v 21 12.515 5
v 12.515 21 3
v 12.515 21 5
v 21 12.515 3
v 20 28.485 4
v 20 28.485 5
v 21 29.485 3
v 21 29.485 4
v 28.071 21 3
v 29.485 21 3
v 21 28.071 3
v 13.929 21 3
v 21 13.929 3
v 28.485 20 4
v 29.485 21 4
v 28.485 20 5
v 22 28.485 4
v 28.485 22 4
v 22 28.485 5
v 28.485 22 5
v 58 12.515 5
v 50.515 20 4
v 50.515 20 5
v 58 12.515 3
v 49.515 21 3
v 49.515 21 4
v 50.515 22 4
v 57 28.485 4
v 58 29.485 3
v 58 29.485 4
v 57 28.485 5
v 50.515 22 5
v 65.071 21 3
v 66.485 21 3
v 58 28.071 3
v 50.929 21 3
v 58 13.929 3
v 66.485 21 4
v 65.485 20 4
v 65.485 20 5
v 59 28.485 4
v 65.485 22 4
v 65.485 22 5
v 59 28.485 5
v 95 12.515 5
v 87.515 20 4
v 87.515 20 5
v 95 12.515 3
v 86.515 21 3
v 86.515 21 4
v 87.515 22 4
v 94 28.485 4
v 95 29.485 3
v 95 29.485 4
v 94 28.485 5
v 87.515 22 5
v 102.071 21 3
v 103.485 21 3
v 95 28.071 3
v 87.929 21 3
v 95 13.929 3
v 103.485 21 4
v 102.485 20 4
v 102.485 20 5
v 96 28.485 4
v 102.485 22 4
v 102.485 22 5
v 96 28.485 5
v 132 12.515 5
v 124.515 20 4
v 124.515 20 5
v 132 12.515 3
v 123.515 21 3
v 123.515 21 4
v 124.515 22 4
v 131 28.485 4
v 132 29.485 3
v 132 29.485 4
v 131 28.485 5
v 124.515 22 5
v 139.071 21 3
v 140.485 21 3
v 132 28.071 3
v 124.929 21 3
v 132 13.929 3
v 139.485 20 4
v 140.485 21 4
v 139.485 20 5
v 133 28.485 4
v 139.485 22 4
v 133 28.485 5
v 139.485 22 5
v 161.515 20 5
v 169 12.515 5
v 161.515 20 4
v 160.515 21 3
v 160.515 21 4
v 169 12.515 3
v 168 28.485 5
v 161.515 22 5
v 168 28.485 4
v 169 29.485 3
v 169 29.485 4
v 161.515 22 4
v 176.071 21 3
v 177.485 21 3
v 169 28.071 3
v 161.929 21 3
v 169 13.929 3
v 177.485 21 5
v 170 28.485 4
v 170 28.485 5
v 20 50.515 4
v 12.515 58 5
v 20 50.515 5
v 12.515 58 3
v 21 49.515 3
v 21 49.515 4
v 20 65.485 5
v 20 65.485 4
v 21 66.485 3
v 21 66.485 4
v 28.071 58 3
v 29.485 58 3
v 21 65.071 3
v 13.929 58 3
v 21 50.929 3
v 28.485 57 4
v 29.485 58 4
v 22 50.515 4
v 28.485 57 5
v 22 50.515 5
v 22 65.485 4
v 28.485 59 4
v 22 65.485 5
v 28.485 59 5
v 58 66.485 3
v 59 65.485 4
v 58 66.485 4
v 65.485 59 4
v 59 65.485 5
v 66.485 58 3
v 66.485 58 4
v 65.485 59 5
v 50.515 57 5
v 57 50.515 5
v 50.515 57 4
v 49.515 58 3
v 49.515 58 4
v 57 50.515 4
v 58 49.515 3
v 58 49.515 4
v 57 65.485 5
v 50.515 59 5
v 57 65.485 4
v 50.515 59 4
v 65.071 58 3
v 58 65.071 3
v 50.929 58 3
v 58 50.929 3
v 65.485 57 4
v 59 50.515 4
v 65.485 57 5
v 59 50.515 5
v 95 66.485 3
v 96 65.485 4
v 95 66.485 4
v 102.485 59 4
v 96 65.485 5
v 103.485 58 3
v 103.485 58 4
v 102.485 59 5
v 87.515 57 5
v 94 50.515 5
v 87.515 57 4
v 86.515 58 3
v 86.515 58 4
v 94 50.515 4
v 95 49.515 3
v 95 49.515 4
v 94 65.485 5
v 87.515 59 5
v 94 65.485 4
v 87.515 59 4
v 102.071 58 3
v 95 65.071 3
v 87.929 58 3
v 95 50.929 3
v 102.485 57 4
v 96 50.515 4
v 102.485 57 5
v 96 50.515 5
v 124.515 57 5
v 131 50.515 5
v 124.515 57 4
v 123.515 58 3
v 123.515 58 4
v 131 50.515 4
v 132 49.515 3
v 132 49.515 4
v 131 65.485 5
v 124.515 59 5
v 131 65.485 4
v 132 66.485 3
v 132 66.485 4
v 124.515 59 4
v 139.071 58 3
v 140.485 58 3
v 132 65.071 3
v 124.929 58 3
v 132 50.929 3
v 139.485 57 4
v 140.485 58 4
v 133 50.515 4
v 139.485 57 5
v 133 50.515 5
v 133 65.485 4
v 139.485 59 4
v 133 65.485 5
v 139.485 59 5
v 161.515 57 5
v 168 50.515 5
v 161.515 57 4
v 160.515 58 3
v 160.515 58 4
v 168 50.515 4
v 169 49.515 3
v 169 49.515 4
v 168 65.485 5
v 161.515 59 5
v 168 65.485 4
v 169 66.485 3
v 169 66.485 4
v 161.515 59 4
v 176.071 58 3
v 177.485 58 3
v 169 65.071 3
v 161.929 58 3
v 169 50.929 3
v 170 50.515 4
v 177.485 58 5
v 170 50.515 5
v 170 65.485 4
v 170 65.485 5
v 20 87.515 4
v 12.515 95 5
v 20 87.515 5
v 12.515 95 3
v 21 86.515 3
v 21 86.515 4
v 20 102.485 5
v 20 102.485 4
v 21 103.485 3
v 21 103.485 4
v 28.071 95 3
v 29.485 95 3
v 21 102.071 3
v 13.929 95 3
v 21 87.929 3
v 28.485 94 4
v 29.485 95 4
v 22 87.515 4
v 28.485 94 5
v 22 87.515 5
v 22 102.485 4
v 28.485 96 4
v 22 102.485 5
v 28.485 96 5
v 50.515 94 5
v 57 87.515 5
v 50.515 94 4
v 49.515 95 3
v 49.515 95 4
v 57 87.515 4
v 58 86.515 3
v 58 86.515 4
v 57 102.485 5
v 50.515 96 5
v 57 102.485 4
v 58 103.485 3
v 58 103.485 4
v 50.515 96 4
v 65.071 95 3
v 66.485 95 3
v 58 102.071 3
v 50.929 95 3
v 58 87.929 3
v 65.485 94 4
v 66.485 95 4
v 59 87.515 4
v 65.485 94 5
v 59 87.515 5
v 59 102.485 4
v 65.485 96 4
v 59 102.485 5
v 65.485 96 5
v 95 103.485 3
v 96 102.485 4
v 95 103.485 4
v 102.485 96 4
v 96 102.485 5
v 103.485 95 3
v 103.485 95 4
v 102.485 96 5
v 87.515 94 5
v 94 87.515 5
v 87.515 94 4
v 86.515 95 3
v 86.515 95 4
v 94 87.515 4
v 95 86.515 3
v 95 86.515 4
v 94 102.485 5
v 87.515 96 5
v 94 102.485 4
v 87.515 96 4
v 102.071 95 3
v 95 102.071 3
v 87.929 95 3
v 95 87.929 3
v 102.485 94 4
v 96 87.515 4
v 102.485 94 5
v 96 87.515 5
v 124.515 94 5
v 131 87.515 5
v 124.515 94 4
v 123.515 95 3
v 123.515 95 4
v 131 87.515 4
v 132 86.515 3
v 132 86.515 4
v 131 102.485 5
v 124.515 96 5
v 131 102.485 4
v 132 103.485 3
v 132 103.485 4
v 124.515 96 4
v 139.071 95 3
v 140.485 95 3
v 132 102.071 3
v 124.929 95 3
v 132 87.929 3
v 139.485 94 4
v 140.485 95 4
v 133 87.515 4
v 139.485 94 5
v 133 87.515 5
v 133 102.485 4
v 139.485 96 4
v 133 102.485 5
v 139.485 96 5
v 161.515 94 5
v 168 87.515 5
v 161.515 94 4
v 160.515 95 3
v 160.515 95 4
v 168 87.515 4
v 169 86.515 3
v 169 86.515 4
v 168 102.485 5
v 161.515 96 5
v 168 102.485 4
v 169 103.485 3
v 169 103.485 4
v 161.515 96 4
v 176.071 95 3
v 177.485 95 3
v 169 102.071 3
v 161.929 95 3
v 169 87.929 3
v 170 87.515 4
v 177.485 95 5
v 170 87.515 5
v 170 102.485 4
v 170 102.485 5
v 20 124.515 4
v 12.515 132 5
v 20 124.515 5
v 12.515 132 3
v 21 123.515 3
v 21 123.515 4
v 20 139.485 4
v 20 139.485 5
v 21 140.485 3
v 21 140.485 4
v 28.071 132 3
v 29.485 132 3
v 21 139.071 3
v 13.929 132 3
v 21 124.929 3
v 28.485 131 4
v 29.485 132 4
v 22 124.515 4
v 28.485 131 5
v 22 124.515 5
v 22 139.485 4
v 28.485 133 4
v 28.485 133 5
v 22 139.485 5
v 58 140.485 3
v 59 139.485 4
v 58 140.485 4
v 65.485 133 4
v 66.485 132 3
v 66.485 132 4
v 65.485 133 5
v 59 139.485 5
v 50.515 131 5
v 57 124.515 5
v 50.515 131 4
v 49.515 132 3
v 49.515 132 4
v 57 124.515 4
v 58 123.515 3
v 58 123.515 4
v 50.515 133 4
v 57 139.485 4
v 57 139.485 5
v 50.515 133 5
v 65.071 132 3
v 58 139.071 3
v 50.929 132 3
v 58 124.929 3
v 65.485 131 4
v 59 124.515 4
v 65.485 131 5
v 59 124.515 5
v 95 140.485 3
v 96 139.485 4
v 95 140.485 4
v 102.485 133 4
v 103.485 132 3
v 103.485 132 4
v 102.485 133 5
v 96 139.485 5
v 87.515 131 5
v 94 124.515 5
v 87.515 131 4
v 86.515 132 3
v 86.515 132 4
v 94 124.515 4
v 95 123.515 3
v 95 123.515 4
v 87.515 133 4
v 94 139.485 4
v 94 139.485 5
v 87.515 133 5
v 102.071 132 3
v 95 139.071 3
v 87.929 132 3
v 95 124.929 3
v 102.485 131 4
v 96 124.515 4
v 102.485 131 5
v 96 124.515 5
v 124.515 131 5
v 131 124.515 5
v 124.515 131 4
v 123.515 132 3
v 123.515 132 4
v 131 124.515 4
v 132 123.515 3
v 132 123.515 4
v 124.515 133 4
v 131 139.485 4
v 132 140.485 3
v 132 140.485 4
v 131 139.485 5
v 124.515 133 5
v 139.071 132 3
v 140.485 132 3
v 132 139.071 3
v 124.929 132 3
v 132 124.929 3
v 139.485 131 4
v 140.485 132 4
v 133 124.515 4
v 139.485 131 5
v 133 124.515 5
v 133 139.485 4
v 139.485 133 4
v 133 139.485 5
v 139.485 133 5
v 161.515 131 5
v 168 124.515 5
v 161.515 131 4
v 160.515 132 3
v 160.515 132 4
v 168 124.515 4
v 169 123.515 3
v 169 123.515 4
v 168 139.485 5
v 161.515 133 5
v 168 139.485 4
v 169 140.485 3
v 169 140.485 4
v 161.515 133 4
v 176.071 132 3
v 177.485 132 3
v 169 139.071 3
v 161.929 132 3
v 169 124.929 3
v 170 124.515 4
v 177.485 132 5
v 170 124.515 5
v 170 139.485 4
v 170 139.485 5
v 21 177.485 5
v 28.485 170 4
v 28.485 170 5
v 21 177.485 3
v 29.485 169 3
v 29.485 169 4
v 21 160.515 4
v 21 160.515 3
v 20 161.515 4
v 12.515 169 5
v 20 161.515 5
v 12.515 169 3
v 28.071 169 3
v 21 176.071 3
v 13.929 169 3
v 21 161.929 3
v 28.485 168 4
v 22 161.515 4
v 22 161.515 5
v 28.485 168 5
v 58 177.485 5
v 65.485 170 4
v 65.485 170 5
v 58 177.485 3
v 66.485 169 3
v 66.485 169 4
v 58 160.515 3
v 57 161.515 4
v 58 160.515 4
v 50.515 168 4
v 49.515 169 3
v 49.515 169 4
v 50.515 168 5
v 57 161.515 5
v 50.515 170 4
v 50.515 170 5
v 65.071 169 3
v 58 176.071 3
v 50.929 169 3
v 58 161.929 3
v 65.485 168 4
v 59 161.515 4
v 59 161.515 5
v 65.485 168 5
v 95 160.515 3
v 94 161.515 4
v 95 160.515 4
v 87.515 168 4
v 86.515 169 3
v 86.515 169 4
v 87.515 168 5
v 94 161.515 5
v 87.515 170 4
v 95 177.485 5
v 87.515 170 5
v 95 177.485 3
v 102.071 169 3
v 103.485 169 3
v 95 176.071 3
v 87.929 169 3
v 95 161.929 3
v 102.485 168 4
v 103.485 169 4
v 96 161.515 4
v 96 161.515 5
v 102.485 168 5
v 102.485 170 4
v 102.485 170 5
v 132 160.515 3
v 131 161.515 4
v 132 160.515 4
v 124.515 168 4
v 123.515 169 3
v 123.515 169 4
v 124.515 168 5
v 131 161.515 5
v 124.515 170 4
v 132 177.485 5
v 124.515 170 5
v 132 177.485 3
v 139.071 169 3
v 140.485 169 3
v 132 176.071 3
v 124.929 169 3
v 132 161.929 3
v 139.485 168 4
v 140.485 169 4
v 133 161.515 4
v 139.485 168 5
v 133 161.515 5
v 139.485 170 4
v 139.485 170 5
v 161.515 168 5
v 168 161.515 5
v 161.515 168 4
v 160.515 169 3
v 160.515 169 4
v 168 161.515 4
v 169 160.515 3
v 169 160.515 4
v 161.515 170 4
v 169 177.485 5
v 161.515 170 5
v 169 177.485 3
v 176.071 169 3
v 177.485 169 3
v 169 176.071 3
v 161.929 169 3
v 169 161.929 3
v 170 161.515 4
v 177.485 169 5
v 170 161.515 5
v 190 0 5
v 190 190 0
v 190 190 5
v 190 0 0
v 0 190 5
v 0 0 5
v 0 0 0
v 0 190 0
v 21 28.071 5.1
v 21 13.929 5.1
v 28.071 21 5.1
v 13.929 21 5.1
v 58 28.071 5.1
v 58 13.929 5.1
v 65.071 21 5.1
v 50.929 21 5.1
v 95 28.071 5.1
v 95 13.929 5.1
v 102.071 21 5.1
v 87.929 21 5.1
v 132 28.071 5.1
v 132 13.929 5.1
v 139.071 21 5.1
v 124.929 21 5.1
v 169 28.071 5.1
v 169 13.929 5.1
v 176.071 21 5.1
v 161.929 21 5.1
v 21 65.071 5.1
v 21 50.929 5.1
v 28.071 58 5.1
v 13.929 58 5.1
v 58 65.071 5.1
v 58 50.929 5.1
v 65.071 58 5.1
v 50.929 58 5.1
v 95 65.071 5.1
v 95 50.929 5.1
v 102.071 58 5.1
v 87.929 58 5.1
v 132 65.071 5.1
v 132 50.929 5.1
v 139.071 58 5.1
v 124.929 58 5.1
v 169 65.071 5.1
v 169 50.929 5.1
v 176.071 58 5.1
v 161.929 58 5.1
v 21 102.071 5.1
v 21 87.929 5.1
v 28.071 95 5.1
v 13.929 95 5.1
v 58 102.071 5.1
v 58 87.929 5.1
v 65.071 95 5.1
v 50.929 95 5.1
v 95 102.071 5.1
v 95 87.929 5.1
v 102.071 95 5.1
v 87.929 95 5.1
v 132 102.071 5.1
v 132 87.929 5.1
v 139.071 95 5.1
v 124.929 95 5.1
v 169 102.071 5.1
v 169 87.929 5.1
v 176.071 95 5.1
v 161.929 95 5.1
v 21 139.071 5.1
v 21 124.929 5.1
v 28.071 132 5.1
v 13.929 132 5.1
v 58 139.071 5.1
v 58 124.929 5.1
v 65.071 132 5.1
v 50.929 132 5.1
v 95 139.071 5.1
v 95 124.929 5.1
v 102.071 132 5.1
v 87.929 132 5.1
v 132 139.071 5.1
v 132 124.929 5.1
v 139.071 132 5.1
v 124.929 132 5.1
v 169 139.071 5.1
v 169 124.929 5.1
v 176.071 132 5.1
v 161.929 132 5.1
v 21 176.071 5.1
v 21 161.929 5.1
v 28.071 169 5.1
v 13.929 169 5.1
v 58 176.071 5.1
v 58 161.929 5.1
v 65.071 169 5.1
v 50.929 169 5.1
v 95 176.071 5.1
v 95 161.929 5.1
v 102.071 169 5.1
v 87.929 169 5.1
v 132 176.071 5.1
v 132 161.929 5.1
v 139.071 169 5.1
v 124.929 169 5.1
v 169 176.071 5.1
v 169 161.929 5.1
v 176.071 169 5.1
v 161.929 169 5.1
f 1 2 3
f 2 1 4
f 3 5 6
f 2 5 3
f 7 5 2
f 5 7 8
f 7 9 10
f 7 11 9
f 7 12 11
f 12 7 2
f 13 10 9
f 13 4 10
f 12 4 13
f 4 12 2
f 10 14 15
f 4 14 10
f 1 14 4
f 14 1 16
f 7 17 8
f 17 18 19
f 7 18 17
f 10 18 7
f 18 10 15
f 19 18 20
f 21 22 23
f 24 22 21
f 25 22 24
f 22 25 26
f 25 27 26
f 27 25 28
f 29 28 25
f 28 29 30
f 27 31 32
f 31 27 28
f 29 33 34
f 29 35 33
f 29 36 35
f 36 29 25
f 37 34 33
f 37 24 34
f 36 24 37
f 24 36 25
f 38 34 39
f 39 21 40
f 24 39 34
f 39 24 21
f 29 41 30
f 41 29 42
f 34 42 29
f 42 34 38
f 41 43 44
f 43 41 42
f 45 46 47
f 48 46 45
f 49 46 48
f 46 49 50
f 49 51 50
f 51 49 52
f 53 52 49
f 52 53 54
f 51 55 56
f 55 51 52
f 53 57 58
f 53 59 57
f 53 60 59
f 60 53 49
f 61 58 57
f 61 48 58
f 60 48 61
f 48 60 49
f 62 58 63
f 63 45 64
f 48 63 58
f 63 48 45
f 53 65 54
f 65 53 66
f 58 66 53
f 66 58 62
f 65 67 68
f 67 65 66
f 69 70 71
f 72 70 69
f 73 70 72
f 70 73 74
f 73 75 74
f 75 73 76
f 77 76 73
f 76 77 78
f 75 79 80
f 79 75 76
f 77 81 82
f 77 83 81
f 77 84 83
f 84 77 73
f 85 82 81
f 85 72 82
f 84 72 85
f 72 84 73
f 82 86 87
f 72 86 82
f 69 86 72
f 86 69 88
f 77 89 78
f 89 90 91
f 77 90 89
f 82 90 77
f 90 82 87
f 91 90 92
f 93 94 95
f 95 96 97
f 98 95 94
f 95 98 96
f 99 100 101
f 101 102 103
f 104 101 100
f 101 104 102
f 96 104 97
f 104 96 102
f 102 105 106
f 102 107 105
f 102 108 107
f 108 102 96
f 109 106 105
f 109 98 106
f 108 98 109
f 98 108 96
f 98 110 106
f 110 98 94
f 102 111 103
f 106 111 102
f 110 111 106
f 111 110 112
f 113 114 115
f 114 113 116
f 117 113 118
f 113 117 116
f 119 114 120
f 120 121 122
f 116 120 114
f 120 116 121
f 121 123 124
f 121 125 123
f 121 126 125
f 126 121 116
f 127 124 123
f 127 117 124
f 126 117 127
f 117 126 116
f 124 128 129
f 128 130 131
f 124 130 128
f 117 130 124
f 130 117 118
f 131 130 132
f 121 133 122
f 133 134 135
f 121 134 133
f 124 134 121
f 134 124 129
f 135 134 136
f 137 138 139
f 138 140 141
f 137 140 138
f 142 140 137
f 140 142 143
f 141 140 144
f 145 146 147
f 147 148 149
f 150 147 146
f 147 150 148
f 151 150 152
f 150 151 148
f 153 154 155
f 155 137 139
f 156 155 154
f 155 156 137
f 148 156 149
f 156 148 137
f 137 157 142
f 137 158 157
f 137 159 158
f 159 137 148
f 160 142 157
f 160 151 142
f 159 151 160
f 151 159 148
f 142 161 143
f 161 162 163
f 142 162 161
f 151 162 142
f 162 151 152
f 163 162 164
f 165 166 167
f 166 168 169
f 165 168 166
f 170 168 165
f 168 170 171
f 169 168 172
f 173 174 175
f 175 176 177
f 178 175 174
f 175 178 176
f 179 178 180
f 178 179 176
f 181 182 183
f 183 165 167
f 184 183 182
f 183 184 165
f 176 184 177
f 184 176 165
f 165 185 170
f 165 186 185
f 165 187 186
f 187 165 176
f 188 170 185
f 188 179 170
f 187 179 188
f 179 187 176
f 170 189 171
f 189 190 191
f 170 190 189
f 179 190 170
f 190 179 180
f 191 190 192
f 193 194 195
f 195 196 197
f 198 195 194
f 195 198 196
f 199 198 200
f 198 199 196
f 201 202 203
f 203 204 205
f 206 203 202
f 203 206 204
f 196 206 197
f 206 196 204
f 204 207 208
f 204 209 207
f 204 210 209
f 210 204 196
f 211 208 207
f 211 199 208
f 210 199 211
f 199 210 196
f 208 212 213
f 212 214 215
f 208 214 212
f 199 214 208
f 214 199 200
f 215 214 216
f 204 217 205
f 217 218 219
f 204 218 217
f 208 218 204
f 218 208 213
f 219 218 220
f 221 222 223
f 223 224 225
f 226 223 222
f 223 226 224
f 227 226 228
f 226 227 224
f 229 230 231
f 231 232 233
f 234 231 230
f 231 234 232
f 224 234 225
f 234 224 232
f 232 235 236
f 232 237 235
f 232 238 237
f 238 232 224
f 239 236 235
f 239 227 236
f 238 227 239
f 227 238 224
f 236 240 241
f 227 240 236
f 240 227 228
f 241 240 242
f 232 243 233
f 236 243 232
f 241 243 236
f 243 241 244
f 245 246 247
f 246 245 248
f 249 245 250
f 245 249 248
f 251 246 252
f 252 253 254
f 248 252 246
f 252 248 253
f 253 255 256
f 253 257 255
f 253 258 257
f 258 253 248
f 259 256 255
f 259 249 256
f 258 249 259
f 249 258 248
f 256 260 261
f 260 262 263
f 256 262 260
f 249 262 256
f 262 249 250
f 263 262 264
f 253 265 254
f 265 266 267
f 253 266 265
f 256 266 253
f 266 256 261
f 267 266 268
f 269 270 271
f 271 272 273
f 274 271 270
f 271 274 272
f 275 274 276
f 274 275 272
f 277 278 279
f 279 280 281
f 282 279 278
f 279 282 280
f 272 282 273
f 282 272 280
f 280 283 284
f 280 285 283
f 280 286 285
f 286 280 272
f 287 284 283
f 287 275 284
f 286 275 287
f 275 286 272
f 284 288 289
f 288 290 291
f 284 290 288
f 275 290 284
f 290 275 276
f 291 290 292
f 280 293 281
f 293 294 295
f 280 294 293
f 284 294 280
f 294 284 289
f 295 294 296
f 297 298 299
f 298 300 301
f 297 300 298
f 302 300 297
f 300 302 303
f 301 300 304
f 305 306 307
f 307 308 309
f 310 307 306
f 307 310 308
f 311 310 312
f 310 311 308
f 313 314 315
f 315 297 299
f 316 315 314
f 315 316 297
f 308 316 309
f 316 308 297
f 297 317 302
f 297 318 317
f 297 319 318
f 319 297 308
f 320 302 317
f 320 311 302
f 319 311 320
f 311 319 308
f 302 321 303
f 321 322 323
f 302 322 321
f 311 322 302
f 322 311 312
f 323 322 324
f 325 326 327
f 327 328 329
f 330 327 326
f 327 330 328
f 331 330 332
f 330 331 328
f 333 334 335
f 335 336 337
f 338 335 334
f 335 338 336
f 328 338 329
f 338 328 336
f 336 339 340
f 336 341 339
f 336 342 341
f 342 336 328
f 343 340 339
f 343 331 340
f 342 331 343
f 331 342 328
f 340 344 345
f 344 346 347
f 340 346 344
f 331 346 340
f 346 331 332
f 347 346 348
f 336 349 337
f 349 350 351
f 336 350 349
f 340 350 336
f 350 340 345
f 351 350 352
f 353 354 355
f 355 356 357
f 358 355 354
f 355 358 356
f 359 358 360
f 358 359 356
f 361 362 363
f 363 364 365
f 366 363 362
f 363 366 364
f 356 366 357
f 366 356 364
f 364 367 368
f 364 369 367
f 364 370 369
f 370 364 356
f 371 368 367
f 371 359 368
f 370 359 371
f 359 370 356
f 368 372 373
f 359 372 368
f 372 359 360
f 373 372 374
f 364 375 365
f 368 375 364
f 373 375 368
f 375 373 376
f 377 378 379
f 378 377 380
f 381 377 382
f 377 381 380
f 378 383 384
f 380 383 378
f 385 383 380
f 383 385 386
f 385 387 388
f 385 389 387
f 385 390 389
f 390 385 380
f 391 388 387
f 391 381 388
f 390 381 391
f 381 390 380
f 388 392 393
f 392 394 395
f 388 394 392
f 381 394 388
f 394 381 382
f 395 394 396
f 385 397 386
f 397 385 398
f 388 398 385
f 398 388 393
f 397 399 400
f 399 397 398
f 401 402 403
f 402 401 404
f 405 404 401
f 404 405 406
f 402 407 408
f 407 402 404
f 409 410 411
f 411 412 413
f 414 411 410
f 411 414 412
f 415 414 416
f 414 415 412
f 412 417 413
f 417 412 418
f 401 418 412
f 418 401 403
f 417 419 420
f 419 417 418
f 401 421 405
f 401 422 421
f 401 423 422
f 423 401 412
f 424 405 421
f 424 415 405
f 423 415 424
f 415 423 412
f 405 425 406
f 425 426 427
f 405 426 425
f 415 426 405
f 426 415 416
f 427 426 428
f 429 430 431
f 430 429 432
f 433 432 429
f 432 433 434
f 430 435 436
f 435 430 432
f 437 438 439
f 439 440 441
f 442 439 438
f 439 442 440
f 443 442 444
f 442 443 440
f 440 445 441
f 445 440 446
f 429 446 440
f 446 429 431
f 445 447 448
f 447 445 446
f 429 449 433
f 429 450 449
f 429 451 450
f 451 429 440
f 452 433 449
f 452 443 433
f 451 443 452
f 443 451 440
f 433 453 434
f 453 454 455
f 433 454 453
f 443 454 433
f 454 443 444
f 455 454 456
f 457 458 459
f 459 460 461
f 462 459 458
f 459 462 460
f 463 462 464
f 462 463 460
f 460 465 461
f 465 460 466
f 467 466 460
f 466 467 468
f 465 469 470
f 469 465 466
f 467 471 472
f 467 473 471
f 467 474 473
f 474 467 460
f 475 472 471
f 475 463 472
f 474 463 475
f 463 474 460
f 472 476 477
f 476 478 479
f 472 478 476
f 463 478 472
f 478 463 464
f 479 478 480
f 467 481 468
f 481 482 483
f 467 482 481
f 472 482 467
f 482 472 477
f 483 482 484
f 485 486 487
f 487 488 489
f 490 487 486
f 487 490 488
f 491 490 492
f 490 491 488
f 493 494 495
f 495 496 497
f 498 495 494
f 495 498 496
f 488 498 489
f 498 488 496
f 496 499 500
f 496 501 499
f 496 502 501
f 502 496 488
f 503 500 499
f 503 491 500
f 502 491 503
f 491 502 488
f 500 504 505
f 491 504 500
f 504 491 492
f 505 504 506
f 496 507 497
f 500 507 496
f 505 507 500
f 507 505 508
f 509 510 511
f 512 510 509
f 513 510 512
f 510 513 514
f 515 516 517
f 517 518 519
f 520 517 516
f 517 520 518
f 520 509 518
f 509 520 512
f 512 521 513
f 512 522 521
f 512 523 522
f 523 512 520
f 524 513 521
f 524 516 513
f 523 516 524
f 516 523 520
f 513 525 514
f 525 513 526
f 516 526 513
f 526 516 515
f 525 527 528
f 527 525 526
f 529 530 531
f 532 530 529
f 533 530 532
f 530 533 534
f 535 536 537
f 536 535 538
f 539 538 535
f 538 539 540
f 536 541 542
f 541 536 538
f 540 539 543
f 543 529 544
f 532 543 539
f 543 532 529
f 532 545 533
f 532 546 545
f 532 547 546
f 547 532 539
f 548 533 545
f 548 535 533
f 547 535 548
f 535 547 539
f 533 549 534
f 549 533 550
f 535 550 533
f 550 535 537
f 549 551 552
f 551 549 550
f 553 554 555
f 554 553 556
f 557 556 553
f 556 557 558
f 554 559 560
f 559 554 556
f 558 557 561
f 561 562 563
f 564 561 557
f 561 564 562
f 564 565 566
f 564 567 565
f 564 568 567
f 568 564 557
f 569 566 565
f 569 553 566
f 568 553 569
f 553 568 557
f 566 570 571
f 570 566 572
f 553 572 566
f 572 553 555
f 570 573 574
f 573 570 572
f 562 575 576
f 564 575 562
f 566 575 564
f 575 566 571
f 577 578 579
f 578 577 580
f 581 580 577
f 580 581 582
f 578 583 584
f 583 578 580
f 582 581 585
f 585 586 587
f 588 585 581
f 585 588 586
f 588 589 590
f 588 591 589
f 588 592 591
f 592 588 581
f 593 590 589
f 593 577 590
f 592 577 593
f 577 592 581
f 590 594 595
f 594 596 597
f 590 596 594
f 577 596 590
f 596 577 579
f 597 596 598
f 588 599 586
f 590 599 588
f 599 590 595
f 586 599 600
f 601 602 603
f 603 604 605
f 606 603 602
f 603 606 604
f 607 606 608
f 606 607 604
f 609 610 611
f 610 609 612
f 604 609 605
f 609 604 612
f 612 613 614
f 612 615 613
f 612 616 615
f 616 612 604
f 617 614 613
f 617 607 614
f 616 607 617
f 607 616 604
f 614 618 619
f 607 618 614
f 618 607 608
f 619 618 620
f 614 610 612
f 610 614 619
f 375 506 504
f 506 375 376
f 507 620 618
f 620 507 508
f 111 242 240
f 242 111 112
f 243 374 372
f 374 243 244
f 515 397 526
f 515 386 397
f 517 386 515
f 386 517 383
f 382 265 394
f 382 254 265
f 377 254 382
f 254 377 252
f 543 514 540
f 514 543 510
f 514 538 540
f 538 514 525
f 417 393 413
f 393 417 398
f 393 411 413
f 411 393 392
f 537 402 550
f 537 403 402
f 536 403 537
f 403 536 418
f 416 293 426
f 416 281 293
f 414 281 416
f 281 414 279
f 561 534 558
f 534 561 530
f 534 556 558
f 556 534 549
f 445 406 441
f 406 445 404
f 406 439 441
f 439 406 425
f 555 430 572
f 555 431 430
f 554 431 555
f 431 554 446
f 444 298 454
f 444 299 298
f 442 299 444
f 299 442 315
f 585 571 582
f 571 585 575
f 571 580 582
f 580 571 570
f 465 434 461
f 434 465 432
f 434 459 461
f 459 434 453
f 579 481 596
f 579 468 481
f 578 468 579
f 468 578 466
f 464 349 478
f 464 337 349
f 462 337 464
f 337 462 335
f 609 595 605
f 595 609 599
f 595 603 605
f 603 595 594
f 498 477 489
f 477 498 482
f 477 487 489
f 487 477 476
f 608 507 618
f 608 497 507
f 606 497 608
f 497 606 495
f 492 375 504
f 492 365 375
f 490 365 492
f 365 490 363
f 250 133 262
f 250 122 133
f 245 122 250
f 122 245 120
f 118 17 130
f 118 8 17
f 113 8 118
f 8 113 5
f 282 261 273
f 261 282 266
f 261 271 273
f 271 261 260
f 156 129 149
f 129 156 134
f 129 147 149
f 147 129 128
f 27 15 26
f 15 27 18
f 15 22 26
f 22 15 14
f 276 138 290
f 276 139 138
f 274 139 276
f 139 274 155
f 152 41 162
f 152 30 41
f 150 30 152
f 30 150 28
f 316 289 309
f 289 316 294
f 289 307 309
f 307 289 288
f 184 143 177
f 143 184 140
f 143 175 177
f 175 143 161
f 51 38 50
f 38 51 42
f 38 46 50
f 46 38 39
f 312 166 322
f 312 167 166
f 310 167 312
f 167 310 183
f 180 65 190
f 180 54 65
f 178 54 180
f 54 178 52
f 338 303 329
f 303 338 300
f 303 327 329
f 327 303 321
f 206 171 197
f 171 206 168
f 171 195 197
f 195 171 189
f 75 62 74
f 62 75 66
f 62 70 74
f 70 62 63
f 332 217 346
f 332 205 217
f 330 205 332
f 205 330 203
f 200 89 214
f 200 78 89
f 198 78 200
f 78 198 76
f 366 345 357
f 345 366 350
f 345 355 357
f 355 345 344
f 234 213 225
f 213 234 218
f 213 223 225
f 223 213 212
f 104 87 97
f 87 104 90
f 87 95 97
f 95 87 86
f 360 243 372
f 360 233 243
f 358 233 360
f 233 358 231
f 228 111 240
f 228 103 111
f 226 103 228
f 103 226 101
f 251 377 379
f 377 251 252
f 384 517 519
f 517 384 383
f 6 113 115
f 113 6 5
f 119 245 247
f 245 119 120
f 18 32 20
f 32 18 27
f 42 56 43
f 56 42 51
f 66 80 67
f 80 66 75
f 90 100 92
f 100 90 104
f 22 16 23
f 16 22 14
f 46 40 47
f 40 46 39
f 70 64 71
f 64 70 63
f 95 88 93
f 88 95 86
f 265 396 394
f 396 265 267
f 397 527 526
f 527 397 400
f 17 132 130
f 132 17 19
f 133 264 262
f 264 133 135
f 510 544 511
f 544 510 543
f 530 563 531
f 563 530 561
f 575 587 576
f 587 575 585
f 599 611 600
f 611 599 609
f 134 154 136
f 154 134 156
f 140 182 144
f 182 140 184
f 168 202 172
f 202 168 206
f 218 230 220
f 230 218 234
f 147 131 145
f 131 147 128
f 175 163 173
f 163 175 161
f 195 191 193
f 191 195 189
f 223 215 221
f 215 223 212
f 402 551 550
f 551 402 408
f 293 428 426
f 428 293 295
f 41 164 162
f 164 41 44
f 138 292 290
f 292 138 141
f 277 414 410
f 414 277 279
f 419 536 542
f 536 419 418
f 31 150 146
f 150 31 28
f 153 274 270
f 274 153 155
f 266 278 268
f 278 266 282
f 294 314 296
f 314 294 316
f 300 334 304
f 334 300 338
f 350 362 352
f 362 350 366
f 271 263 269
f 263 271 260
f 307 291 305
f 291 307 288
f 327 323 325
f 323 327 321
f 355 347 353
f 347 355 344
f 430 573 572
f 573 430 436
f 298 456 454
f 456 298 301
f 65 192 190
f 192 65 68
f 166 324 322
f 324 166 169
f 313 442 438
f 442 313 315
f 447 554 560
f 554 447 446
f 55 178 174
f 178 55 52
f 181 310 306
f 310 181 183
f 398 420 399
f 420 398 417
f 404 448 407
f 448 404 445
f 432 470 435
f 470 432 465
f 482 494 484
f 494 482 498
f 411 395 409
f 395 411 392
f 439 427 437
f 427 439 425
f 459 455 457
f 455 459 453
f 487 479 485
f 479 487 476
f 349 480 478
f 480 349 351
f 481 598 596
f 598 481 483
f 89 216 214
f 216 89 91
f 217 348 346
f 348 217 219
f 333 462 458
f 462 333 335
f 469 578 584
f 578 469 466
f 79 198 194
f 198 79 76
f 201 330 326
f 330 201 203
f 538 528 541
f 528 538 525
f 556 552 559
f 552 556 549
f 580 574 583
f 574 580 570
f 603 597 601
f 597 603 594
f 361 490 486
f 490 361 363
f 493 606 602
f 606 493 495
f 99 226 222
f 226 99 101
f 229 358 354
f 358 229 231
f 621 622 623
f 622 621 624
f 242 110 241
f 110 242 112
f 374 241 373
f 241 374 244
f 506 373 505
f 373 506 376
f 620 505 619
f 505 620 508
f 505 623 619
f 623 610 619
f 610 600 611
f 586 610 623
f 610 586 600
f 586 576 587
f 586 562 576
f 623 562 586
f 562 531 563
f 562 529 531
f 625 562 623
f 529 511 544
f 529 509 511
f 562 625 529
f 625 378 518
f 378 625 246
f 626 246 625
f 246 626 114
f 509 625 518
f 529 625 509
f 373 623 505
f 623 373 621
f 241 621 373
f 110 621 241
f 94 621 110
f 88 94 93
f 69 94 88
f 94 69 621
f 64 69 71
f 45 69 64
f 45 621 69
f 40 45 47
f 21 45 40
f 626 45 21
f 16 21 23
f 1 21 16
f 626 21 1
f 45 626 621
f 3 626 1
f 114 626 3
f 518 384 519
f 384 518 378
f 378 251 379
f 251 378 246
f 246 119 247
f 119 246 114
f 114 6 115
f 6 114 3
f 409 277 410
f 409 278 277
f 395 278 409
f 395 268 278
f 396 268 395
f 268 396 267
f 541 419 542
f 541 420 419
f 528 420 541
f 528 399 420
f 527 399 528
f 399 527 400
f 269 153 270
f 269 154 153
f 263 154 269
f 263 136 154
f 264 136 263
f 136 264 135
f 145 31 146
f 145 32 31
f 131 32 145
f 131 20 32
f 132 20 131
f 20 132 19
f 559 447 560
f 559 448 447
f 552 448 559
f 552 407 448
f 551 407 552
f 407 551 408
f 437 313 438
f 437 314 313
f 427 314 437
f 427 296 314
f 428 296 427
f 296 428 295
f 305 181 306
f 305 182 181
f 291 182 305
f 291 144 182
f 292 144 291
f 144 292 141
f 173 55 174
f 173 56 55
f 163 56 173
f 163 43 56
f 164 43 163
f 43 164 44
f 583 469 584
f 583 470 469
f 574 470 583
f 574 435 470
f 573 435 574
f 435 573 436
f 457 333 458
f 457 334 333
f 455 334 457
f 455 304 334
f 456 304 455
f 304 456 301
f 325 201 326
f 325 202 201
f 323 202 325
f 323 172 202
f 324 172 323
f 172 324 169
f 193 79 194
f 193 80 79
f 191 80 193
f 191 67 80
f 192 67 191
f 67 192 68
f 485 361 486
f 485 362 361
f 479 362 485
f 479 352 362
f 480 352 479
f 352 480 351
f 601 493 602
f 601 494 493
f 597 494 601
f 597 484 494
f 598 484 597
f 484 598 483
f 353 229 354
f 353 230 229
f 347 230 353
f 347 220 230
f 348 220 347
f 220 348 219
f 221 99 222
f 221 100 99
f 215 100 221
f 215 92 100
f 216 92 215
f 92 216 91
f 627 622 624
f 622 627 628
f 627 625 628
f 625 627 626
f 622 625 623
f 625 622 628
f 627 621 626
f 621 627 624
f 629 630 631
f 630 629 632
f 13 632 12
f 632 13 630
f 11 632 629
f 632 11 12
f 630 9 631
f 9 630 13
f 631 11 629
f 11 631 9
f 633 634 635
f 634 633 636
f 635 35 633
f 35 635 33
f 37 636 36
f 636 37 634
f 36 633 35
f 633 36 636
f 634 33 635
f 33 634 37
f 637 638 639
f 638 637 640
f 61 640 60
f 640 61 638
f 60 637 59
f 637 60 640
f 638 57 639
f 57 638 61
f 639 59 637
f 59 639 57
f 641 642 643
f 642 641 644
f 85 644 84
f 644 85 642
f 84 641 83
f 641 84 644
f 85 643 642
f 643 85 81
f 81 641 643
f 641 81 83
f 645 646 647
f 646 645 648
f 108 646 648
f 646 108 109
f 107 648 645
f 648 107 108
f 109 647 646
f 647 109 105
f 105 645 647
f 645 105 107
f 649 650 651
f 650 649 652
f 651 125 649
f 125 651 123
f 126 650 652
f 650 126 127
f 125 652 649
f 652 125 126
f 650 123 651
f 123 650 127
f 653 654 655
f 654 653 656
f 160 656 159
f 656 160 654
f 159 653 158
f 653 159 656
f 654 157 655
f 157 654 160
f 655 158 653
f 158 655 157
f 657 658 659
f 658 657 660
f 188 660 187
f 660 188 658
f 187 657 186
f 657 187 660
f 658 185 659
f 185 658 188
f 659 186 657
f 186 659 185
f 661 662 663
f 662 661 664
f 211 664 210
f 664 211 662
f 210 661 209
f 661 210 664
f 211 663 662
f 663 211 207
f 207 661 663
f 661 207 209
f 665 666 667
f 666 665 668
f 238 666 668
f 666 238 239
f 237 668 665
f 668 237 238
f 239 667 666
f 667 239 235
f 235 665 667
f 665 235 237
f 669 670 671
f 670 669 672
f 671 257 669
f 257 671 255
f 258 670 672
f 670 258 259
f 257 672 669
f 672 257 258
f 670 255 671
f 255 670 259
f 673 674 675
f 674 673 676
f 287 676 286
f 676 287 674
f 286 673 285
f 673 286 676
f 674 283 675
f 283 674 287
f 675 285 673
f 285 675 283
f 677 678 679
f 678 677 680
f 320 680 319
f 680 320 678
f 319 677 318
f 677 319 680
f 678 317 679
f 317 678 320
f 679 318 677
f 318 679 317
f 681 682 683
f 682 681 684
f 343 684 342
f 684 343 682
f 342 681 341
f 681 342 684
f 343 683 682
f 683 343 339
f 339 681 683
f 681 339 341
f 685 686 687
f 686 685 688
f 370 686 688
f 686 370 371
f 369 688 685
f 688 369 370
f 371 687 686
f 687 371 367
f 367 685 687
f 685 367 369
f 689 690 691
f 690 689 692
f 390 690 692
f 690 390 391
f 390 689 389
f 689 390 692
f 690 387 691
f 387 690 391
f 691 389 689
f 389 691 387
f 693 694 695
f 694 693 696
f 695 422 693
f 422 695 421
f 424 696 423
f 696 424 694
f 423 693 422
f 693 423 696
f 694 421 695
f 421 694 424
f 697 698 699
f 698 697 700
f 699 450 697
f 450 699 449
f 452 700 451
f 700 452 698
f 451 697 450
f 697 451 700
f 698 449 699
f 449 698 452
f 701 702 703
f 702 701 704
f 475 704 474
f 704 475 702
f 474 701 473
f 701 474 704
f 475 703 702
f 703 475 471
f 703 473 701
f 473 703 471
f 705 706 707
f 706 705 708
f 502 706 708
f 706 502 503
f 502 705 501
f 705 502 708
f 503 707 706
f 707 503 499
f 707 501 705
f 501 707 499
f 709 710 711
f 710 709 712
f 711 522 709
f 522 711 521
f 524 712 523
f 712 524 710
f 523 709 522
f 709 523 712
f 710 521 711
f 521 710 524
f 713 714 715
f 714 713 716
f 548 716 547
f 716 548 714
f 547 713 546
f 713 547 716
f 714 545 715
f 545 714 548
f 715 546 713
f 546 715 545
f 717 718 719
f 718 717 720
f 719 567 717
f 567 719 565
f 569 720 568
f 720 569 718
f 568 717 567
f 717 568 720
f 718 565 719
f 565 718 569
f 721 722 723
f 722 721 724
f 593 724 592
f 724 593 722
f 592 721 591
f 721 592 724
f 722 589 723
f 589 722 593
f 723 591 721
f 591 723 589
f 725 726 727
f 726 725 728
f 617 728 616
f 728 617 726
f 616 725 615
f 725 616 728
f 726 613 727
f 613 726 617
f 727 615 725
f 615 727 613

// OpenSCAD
/* Customizable 'Tak - A beautiful game' playing board
 */

// The border (in mm) to leave around the board
BORDER=20;
// The number of big squares (hybrid will be +1) in the board
SQUARES=4;
// The height (in mm) of the board
HEIGHT=5;
// The size (in mm) of the big squares of the board
SQUARE_SIZE=35;
// The width (in mm) of the line separating squares on the board
SEPARATOR_SIZE=2;
// The depth (in mm) of the separating lines
SEPARATOR_DEPTH=1;
// The size (in mm) of the hybrid squares (set to 0 to disable hybrid)
HYBRID_SIZE=10;
// The width (in mm) of the separator around the hybrid squares (set ot 0 to disbale hybrid)
HYBRID_SEPARATOR_SIZE=1;
// The depth (in mm) of the hybrid squares and their separator
HYBRID_DEPTH=2;
// Hybrid mode for dual extrusion possibility
HYBRID_MODE="single"; // ["single":All-in-One single extruder board , "main":Main board without the hybrid squares for dual extrusion, "hybrid":Hybrid only squares for dual extrustion] 

eta=0.1;

BOARD_SIZE = BORDER*2 + (SQUARE_SIZE + SEPARATOR_SIZE) * SQUARES + SEPARATOR_SIZE;
HYBRID_TOTAL_SIZE = HYBRID_SIZE + HYBRID_SEPARATOR_SIZE * 2;
HYBRID_HYP=sqrt(HYBRID_SIZE * HYBRID_SIZE * 2);
HYBRID_TOTAL_HYP=sqrt(HYBRID_TOTAL_SIZE * HYBRID_TOTAL_SIZE * 2);

union () {
  if (HYBRID_MODE == "single" || HYBRID_MODE == "main") {
    difference () {
      // The board
      cube([BOARD_SIZE, BOARD_SIZE, 5]);

      for (line = [0 : 1 : SQUARES]) {
        // Create the grid
        translate([BORDER, BORDER + (SQUARE_SIZE + SEPARATOR_SIZE) * line, HEIGHT-SEPARATOR_DEPTH])
          cube([BOARD_SIZE - BORDER*2, SEPARATOR_SIZE, SEPARATOR_DEPTH+eta]);
        translate([BORDER + (SQUARE_SIZE + SEPARATOR_SIZE) * line, BORDER, HEIGHT-SEPARATOR_DEPTH])
          cube([SEPARATOR_SIZE, BOARD_SIZE - BORDER*2, SEPARATOR_DEPTH+eta]);

        // Remove the hybrid squares
        for (column = [0 : 1 : SQUARES]) {
          translate([BORDER + SEPARATOR_SIZE/2 + (SQUARE_SIZE + SEPARATOR_SIZE) * column,
                     BORDER + SEPARATOR_SIZE/2 - HYBRID_TOTAL_HYP/2 + (SQUARE_SIZE + SEPARATOR_SIZE) * line, HEIGHT-HYBRID_DEPTH])
            rotate([0, 0, 45])
            cube([HYBRID_TOTAL_SIZE, HYBRID_TOTAL_SIZE, HYBRID_DEPTH+eta]);
        }
      }
    }
  }
  if (HYBRID_MODE == "single" || HYBRID_MODE == "hybrid") {
    // Create hybrid squares
    for (line = [0 : 1 : SQUARES]) {
      for (column = [0 : 1 : SQUARES]) {
        translate([BORDER + SEPARATOR_SIZE/2 + (SQUARE_SIZE + SEPARATOR_SIZE) * column,
                   BORDER + SEPARATOR_SIZE/2 - HYBRID_HYP/2 + (SQUARE_SIZE + SEPARATOR_SIZE) * line, HEIGHT-HYBRID_DEPTH])
          rotate([0, 0, 45])
          cube([HYBRID_SIZE, HYBRID_SIZE, HYBRID_DEPTH+eta]);
      }
    }
  }
}
